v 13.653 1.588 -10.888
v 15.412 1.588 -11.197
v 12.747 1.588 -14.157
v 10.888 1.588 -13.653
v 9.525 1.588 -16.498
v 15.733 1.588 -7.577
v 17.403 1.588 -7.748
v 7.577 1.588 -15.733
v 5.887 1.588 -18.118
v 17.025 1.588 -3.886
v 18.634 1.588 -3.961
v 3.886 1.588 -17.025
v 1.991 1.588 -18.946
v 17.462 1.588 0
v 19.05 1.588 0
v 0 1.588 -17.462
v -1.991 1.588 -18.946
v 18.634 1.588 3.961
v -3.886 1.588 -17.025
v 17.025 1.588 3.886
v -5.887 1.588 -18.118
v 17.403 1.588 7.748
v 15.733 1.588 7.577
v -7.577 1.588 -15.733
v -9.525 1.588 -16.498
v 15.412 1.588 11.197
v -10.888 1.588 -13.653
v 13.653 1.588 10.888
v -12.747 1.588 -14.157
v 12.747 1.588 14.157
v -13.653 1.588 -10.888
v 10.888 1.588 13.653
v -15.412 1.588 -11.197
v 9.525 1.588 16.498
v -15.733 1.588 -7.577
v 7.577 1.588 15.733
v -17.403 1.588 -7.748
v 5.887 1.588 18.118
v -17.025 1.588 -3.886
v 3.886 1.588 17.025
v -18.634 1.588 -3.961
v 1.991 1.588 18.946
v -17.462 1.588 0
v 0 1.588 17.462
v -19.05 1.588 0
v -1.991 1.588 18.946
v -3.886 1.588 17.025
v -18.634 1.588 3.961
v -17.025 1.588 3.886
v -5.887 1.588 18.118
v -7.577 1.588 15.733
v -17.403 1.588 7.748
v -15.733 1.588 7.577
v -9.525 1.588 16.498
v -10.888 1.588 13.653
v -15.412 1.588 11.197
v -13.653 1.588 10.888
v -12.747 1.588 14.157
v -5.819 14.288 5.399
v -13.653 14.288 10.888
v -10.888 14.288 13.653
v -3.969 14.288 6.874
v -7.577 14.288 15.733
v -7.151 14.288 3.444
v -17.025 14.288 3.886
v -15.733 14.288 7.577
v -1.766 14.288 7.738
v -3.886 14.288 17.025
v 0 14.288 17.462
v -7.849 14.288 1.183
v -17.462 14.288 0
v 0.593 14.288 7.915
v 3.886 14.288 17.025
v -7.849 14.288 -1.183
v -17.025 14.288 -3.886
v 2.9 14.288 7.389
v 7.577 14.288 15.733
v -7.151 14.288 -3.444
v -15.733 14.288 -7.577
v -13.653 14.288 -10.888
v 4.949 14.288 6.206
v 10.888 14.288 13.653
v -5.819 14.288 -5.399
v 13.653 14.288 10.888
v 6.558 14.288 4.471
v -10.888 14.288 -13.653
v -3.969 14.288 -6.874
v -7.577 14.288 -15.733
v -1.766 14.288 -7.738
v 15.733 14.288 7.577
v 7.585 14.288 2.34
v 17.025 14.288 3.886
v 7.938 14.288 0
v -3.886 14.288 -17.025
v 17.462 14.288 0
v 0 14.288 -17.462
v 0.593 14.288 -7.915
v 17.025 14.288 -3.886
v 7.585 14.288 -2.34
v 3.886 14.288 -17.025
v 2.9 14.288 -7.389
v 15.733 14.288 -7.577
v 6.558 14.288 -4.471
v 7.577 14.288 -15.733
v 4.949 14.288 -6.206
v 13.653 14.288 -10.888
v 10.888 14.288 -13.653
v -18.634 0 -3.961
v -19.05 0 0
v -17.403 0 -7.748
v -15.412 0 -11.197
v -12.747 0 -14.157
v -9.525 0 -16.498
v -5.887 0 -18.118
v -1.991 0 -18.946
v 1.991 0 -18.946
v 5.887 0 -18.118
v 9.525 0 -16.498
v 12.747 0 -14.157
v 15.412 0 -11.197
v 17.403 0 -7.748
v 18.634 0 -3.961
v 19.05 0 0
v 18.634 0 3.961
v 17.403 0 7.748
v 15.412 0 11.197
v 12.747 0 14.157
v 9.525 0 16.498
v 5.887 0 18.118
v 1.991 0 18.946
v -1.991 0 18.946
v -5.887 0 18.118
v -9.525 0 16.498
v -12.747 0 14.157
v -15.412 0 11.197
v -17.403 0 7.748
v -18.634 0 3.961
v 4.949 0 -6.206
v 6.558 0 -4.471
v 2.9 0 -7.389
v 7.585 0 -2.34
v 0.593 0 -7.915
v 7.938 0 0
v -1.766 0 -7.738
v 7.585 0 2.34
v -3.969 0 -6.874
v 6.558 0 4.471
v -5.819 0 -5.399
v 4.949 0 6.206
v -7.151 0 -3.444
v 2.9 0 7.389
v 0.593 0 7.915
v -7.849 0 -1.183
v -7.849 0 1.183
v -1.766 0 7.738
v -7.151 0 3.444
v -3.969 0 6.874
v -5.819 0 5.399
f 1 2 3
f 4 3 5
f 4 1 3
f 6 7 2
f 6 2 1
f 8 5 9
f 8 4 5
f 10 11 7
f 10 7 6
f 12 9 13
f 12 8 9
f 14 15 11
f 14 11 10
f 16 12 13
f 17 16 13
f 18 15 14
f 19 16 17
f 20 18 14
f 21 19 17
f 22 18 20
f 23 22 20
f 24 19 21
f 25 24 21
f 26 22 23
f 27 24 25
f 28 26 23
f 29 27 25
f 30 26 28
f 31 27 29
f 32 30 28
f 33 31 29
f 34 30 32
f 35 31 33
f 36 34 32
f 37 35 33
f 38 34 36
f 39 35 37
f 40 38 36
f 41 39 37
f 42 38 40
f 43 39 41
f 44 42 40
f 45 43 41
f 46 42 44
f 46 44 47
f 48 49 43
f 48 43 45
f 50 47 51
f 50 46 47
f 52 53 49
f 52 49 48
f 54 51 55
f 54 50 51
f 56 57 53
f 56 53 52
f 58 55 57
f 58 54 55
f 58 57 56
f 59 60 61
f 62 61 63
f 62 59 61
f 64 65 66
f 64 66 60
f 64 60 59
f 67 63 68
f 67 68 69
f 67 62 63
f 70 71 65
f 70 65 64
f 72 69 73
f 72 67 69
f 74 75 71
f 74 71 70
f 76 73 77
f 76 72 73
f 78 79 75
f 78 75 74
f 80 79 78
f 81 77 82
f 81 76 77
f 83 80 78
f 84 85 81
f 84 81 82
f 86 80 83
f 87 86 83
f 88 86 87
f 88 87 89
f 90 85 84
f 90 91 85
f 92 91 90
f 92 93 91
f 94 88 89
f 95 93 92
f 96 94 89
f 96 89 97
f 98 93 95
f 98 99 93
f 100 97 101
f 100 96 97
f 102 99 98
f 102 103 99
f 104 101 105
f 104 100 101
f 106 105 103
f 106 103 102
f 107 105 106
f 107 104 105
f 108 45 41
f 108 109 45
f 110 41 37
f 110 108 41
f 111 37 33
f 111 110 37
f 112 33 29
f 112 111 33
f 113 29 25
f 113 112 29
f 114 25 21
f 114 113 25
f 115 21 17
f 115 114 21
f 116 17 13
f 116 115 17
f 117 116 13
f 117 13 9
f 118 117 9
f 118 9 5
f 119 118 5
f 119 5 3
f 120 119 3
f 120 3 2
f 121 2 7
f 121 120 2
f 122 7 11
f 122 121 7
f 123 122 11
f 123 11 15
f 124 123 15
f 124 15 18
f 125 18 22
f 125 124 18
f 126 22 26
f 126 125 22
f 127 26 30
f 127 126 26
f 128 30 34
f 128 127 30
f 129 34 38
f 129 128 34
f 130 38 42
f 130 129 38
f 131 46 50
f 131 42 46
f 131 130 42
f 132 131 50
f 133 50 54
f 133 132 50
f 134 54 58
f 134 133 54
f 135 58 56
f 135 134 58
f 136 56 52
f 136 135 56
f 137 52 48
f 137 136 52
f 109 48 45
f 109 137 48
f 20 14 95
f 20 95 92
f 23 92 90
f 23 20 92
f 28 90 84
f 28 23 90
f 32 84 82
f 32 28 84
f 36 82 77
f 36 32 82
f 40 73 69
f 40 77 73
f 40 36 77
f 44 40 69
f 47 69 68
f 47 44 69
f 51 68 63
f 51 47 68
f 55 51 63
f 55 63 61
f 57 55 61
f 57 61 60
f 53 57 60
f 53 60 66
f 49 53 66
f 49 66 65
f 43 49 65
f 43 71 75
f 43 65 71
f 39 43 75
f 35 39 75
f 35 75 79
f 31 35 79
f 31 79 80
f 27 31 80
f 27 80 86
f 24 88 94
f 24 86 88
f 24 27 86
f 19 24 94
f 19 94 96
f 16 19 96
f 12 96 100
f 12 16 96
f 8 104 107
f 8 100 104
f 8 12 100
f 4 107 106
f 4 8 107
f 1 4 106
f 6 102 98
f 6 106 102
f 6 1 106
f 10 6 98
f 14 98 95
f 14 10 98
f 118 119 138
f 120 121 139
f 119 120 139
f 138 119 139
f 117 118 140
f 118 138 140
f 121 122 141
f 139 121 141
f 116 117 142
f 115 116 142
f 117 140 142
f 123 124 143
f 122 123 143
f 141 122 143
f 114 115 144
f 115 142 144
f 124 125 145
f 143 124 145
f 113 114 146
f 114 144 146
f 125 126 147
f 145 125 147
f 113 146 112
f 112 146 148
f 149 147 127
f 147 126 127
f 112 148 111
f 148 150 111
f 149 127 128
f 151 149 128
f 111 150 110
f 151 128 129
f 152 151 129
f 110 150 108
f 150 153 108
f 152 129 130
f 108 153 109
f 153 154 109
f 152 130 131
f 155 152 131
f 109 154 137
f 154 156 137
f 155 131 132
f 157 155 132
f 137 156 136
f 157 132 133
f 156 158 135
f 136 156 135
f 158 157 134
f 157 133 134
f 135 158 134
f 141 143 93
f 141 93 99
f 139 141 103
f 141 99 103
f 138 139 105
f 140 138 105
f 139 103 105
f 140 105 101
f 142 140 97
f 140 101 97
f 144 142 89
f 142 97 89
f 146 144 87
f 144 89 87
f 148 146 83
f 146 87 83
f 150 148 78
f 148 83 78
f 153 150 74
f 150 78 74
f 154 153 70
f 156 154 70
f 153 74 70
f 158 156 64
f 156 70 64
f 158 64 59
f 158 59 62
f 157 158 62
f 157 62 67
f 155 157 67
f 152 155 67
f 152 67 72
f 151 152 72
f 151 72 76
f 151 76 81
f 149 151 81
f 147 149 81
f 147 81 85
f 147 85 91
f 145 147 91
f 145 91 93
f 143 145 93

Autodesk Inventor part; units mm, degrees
ref_plane "YZ Plane" through (0, 0, 0) normal (1, 0, 0) x (0, 1, 0)
ref_plane "XZ Plane" through (0, 0, 0) normal (0, 1, 0) x (-1, 0, 0)
ref_plane "XY Plane" through (0, 0, 0) normal (0, 0, 1) x (1, 0, 0)
sketch "Sketch1" plane through (0, 0, 0) normal (0, 1, 0) x (-1, 0, 0)
  circle A0 centre (0, 0) radius 19.05
  dimension "d0" = 38.1
extrude "Extrusion1" add sketch "Sketch1" along normal blind 1.5875
sketch "Sketch2" plane through (0, 1.5875, 0) normal (0, 1, 0) x (1, 0, 0)
  circle A0 centre (0, 0) radius 19.05 projected
  circle A1 centre (0, 0) radius 17.4625
  dimension "d3" = 34.925
extrude "Extrusion2" add sketch "Sketch2" along normal blind 12.7 contours A1
sketch "Sketch3" plane through (0, 14.2875, 0) normal (0, 1, 0) x (1, 0, 0)
  circle A0 centre (0, 0) radius 17.4625 projected
  circle A1 centre (0, 0) radius 7.9375
  dimension "d6" = 15.875
extrude "Extrusion3" cut sketch "Sketch3" against normal blind 2540 contours A1
properties part number "New Bearing"
